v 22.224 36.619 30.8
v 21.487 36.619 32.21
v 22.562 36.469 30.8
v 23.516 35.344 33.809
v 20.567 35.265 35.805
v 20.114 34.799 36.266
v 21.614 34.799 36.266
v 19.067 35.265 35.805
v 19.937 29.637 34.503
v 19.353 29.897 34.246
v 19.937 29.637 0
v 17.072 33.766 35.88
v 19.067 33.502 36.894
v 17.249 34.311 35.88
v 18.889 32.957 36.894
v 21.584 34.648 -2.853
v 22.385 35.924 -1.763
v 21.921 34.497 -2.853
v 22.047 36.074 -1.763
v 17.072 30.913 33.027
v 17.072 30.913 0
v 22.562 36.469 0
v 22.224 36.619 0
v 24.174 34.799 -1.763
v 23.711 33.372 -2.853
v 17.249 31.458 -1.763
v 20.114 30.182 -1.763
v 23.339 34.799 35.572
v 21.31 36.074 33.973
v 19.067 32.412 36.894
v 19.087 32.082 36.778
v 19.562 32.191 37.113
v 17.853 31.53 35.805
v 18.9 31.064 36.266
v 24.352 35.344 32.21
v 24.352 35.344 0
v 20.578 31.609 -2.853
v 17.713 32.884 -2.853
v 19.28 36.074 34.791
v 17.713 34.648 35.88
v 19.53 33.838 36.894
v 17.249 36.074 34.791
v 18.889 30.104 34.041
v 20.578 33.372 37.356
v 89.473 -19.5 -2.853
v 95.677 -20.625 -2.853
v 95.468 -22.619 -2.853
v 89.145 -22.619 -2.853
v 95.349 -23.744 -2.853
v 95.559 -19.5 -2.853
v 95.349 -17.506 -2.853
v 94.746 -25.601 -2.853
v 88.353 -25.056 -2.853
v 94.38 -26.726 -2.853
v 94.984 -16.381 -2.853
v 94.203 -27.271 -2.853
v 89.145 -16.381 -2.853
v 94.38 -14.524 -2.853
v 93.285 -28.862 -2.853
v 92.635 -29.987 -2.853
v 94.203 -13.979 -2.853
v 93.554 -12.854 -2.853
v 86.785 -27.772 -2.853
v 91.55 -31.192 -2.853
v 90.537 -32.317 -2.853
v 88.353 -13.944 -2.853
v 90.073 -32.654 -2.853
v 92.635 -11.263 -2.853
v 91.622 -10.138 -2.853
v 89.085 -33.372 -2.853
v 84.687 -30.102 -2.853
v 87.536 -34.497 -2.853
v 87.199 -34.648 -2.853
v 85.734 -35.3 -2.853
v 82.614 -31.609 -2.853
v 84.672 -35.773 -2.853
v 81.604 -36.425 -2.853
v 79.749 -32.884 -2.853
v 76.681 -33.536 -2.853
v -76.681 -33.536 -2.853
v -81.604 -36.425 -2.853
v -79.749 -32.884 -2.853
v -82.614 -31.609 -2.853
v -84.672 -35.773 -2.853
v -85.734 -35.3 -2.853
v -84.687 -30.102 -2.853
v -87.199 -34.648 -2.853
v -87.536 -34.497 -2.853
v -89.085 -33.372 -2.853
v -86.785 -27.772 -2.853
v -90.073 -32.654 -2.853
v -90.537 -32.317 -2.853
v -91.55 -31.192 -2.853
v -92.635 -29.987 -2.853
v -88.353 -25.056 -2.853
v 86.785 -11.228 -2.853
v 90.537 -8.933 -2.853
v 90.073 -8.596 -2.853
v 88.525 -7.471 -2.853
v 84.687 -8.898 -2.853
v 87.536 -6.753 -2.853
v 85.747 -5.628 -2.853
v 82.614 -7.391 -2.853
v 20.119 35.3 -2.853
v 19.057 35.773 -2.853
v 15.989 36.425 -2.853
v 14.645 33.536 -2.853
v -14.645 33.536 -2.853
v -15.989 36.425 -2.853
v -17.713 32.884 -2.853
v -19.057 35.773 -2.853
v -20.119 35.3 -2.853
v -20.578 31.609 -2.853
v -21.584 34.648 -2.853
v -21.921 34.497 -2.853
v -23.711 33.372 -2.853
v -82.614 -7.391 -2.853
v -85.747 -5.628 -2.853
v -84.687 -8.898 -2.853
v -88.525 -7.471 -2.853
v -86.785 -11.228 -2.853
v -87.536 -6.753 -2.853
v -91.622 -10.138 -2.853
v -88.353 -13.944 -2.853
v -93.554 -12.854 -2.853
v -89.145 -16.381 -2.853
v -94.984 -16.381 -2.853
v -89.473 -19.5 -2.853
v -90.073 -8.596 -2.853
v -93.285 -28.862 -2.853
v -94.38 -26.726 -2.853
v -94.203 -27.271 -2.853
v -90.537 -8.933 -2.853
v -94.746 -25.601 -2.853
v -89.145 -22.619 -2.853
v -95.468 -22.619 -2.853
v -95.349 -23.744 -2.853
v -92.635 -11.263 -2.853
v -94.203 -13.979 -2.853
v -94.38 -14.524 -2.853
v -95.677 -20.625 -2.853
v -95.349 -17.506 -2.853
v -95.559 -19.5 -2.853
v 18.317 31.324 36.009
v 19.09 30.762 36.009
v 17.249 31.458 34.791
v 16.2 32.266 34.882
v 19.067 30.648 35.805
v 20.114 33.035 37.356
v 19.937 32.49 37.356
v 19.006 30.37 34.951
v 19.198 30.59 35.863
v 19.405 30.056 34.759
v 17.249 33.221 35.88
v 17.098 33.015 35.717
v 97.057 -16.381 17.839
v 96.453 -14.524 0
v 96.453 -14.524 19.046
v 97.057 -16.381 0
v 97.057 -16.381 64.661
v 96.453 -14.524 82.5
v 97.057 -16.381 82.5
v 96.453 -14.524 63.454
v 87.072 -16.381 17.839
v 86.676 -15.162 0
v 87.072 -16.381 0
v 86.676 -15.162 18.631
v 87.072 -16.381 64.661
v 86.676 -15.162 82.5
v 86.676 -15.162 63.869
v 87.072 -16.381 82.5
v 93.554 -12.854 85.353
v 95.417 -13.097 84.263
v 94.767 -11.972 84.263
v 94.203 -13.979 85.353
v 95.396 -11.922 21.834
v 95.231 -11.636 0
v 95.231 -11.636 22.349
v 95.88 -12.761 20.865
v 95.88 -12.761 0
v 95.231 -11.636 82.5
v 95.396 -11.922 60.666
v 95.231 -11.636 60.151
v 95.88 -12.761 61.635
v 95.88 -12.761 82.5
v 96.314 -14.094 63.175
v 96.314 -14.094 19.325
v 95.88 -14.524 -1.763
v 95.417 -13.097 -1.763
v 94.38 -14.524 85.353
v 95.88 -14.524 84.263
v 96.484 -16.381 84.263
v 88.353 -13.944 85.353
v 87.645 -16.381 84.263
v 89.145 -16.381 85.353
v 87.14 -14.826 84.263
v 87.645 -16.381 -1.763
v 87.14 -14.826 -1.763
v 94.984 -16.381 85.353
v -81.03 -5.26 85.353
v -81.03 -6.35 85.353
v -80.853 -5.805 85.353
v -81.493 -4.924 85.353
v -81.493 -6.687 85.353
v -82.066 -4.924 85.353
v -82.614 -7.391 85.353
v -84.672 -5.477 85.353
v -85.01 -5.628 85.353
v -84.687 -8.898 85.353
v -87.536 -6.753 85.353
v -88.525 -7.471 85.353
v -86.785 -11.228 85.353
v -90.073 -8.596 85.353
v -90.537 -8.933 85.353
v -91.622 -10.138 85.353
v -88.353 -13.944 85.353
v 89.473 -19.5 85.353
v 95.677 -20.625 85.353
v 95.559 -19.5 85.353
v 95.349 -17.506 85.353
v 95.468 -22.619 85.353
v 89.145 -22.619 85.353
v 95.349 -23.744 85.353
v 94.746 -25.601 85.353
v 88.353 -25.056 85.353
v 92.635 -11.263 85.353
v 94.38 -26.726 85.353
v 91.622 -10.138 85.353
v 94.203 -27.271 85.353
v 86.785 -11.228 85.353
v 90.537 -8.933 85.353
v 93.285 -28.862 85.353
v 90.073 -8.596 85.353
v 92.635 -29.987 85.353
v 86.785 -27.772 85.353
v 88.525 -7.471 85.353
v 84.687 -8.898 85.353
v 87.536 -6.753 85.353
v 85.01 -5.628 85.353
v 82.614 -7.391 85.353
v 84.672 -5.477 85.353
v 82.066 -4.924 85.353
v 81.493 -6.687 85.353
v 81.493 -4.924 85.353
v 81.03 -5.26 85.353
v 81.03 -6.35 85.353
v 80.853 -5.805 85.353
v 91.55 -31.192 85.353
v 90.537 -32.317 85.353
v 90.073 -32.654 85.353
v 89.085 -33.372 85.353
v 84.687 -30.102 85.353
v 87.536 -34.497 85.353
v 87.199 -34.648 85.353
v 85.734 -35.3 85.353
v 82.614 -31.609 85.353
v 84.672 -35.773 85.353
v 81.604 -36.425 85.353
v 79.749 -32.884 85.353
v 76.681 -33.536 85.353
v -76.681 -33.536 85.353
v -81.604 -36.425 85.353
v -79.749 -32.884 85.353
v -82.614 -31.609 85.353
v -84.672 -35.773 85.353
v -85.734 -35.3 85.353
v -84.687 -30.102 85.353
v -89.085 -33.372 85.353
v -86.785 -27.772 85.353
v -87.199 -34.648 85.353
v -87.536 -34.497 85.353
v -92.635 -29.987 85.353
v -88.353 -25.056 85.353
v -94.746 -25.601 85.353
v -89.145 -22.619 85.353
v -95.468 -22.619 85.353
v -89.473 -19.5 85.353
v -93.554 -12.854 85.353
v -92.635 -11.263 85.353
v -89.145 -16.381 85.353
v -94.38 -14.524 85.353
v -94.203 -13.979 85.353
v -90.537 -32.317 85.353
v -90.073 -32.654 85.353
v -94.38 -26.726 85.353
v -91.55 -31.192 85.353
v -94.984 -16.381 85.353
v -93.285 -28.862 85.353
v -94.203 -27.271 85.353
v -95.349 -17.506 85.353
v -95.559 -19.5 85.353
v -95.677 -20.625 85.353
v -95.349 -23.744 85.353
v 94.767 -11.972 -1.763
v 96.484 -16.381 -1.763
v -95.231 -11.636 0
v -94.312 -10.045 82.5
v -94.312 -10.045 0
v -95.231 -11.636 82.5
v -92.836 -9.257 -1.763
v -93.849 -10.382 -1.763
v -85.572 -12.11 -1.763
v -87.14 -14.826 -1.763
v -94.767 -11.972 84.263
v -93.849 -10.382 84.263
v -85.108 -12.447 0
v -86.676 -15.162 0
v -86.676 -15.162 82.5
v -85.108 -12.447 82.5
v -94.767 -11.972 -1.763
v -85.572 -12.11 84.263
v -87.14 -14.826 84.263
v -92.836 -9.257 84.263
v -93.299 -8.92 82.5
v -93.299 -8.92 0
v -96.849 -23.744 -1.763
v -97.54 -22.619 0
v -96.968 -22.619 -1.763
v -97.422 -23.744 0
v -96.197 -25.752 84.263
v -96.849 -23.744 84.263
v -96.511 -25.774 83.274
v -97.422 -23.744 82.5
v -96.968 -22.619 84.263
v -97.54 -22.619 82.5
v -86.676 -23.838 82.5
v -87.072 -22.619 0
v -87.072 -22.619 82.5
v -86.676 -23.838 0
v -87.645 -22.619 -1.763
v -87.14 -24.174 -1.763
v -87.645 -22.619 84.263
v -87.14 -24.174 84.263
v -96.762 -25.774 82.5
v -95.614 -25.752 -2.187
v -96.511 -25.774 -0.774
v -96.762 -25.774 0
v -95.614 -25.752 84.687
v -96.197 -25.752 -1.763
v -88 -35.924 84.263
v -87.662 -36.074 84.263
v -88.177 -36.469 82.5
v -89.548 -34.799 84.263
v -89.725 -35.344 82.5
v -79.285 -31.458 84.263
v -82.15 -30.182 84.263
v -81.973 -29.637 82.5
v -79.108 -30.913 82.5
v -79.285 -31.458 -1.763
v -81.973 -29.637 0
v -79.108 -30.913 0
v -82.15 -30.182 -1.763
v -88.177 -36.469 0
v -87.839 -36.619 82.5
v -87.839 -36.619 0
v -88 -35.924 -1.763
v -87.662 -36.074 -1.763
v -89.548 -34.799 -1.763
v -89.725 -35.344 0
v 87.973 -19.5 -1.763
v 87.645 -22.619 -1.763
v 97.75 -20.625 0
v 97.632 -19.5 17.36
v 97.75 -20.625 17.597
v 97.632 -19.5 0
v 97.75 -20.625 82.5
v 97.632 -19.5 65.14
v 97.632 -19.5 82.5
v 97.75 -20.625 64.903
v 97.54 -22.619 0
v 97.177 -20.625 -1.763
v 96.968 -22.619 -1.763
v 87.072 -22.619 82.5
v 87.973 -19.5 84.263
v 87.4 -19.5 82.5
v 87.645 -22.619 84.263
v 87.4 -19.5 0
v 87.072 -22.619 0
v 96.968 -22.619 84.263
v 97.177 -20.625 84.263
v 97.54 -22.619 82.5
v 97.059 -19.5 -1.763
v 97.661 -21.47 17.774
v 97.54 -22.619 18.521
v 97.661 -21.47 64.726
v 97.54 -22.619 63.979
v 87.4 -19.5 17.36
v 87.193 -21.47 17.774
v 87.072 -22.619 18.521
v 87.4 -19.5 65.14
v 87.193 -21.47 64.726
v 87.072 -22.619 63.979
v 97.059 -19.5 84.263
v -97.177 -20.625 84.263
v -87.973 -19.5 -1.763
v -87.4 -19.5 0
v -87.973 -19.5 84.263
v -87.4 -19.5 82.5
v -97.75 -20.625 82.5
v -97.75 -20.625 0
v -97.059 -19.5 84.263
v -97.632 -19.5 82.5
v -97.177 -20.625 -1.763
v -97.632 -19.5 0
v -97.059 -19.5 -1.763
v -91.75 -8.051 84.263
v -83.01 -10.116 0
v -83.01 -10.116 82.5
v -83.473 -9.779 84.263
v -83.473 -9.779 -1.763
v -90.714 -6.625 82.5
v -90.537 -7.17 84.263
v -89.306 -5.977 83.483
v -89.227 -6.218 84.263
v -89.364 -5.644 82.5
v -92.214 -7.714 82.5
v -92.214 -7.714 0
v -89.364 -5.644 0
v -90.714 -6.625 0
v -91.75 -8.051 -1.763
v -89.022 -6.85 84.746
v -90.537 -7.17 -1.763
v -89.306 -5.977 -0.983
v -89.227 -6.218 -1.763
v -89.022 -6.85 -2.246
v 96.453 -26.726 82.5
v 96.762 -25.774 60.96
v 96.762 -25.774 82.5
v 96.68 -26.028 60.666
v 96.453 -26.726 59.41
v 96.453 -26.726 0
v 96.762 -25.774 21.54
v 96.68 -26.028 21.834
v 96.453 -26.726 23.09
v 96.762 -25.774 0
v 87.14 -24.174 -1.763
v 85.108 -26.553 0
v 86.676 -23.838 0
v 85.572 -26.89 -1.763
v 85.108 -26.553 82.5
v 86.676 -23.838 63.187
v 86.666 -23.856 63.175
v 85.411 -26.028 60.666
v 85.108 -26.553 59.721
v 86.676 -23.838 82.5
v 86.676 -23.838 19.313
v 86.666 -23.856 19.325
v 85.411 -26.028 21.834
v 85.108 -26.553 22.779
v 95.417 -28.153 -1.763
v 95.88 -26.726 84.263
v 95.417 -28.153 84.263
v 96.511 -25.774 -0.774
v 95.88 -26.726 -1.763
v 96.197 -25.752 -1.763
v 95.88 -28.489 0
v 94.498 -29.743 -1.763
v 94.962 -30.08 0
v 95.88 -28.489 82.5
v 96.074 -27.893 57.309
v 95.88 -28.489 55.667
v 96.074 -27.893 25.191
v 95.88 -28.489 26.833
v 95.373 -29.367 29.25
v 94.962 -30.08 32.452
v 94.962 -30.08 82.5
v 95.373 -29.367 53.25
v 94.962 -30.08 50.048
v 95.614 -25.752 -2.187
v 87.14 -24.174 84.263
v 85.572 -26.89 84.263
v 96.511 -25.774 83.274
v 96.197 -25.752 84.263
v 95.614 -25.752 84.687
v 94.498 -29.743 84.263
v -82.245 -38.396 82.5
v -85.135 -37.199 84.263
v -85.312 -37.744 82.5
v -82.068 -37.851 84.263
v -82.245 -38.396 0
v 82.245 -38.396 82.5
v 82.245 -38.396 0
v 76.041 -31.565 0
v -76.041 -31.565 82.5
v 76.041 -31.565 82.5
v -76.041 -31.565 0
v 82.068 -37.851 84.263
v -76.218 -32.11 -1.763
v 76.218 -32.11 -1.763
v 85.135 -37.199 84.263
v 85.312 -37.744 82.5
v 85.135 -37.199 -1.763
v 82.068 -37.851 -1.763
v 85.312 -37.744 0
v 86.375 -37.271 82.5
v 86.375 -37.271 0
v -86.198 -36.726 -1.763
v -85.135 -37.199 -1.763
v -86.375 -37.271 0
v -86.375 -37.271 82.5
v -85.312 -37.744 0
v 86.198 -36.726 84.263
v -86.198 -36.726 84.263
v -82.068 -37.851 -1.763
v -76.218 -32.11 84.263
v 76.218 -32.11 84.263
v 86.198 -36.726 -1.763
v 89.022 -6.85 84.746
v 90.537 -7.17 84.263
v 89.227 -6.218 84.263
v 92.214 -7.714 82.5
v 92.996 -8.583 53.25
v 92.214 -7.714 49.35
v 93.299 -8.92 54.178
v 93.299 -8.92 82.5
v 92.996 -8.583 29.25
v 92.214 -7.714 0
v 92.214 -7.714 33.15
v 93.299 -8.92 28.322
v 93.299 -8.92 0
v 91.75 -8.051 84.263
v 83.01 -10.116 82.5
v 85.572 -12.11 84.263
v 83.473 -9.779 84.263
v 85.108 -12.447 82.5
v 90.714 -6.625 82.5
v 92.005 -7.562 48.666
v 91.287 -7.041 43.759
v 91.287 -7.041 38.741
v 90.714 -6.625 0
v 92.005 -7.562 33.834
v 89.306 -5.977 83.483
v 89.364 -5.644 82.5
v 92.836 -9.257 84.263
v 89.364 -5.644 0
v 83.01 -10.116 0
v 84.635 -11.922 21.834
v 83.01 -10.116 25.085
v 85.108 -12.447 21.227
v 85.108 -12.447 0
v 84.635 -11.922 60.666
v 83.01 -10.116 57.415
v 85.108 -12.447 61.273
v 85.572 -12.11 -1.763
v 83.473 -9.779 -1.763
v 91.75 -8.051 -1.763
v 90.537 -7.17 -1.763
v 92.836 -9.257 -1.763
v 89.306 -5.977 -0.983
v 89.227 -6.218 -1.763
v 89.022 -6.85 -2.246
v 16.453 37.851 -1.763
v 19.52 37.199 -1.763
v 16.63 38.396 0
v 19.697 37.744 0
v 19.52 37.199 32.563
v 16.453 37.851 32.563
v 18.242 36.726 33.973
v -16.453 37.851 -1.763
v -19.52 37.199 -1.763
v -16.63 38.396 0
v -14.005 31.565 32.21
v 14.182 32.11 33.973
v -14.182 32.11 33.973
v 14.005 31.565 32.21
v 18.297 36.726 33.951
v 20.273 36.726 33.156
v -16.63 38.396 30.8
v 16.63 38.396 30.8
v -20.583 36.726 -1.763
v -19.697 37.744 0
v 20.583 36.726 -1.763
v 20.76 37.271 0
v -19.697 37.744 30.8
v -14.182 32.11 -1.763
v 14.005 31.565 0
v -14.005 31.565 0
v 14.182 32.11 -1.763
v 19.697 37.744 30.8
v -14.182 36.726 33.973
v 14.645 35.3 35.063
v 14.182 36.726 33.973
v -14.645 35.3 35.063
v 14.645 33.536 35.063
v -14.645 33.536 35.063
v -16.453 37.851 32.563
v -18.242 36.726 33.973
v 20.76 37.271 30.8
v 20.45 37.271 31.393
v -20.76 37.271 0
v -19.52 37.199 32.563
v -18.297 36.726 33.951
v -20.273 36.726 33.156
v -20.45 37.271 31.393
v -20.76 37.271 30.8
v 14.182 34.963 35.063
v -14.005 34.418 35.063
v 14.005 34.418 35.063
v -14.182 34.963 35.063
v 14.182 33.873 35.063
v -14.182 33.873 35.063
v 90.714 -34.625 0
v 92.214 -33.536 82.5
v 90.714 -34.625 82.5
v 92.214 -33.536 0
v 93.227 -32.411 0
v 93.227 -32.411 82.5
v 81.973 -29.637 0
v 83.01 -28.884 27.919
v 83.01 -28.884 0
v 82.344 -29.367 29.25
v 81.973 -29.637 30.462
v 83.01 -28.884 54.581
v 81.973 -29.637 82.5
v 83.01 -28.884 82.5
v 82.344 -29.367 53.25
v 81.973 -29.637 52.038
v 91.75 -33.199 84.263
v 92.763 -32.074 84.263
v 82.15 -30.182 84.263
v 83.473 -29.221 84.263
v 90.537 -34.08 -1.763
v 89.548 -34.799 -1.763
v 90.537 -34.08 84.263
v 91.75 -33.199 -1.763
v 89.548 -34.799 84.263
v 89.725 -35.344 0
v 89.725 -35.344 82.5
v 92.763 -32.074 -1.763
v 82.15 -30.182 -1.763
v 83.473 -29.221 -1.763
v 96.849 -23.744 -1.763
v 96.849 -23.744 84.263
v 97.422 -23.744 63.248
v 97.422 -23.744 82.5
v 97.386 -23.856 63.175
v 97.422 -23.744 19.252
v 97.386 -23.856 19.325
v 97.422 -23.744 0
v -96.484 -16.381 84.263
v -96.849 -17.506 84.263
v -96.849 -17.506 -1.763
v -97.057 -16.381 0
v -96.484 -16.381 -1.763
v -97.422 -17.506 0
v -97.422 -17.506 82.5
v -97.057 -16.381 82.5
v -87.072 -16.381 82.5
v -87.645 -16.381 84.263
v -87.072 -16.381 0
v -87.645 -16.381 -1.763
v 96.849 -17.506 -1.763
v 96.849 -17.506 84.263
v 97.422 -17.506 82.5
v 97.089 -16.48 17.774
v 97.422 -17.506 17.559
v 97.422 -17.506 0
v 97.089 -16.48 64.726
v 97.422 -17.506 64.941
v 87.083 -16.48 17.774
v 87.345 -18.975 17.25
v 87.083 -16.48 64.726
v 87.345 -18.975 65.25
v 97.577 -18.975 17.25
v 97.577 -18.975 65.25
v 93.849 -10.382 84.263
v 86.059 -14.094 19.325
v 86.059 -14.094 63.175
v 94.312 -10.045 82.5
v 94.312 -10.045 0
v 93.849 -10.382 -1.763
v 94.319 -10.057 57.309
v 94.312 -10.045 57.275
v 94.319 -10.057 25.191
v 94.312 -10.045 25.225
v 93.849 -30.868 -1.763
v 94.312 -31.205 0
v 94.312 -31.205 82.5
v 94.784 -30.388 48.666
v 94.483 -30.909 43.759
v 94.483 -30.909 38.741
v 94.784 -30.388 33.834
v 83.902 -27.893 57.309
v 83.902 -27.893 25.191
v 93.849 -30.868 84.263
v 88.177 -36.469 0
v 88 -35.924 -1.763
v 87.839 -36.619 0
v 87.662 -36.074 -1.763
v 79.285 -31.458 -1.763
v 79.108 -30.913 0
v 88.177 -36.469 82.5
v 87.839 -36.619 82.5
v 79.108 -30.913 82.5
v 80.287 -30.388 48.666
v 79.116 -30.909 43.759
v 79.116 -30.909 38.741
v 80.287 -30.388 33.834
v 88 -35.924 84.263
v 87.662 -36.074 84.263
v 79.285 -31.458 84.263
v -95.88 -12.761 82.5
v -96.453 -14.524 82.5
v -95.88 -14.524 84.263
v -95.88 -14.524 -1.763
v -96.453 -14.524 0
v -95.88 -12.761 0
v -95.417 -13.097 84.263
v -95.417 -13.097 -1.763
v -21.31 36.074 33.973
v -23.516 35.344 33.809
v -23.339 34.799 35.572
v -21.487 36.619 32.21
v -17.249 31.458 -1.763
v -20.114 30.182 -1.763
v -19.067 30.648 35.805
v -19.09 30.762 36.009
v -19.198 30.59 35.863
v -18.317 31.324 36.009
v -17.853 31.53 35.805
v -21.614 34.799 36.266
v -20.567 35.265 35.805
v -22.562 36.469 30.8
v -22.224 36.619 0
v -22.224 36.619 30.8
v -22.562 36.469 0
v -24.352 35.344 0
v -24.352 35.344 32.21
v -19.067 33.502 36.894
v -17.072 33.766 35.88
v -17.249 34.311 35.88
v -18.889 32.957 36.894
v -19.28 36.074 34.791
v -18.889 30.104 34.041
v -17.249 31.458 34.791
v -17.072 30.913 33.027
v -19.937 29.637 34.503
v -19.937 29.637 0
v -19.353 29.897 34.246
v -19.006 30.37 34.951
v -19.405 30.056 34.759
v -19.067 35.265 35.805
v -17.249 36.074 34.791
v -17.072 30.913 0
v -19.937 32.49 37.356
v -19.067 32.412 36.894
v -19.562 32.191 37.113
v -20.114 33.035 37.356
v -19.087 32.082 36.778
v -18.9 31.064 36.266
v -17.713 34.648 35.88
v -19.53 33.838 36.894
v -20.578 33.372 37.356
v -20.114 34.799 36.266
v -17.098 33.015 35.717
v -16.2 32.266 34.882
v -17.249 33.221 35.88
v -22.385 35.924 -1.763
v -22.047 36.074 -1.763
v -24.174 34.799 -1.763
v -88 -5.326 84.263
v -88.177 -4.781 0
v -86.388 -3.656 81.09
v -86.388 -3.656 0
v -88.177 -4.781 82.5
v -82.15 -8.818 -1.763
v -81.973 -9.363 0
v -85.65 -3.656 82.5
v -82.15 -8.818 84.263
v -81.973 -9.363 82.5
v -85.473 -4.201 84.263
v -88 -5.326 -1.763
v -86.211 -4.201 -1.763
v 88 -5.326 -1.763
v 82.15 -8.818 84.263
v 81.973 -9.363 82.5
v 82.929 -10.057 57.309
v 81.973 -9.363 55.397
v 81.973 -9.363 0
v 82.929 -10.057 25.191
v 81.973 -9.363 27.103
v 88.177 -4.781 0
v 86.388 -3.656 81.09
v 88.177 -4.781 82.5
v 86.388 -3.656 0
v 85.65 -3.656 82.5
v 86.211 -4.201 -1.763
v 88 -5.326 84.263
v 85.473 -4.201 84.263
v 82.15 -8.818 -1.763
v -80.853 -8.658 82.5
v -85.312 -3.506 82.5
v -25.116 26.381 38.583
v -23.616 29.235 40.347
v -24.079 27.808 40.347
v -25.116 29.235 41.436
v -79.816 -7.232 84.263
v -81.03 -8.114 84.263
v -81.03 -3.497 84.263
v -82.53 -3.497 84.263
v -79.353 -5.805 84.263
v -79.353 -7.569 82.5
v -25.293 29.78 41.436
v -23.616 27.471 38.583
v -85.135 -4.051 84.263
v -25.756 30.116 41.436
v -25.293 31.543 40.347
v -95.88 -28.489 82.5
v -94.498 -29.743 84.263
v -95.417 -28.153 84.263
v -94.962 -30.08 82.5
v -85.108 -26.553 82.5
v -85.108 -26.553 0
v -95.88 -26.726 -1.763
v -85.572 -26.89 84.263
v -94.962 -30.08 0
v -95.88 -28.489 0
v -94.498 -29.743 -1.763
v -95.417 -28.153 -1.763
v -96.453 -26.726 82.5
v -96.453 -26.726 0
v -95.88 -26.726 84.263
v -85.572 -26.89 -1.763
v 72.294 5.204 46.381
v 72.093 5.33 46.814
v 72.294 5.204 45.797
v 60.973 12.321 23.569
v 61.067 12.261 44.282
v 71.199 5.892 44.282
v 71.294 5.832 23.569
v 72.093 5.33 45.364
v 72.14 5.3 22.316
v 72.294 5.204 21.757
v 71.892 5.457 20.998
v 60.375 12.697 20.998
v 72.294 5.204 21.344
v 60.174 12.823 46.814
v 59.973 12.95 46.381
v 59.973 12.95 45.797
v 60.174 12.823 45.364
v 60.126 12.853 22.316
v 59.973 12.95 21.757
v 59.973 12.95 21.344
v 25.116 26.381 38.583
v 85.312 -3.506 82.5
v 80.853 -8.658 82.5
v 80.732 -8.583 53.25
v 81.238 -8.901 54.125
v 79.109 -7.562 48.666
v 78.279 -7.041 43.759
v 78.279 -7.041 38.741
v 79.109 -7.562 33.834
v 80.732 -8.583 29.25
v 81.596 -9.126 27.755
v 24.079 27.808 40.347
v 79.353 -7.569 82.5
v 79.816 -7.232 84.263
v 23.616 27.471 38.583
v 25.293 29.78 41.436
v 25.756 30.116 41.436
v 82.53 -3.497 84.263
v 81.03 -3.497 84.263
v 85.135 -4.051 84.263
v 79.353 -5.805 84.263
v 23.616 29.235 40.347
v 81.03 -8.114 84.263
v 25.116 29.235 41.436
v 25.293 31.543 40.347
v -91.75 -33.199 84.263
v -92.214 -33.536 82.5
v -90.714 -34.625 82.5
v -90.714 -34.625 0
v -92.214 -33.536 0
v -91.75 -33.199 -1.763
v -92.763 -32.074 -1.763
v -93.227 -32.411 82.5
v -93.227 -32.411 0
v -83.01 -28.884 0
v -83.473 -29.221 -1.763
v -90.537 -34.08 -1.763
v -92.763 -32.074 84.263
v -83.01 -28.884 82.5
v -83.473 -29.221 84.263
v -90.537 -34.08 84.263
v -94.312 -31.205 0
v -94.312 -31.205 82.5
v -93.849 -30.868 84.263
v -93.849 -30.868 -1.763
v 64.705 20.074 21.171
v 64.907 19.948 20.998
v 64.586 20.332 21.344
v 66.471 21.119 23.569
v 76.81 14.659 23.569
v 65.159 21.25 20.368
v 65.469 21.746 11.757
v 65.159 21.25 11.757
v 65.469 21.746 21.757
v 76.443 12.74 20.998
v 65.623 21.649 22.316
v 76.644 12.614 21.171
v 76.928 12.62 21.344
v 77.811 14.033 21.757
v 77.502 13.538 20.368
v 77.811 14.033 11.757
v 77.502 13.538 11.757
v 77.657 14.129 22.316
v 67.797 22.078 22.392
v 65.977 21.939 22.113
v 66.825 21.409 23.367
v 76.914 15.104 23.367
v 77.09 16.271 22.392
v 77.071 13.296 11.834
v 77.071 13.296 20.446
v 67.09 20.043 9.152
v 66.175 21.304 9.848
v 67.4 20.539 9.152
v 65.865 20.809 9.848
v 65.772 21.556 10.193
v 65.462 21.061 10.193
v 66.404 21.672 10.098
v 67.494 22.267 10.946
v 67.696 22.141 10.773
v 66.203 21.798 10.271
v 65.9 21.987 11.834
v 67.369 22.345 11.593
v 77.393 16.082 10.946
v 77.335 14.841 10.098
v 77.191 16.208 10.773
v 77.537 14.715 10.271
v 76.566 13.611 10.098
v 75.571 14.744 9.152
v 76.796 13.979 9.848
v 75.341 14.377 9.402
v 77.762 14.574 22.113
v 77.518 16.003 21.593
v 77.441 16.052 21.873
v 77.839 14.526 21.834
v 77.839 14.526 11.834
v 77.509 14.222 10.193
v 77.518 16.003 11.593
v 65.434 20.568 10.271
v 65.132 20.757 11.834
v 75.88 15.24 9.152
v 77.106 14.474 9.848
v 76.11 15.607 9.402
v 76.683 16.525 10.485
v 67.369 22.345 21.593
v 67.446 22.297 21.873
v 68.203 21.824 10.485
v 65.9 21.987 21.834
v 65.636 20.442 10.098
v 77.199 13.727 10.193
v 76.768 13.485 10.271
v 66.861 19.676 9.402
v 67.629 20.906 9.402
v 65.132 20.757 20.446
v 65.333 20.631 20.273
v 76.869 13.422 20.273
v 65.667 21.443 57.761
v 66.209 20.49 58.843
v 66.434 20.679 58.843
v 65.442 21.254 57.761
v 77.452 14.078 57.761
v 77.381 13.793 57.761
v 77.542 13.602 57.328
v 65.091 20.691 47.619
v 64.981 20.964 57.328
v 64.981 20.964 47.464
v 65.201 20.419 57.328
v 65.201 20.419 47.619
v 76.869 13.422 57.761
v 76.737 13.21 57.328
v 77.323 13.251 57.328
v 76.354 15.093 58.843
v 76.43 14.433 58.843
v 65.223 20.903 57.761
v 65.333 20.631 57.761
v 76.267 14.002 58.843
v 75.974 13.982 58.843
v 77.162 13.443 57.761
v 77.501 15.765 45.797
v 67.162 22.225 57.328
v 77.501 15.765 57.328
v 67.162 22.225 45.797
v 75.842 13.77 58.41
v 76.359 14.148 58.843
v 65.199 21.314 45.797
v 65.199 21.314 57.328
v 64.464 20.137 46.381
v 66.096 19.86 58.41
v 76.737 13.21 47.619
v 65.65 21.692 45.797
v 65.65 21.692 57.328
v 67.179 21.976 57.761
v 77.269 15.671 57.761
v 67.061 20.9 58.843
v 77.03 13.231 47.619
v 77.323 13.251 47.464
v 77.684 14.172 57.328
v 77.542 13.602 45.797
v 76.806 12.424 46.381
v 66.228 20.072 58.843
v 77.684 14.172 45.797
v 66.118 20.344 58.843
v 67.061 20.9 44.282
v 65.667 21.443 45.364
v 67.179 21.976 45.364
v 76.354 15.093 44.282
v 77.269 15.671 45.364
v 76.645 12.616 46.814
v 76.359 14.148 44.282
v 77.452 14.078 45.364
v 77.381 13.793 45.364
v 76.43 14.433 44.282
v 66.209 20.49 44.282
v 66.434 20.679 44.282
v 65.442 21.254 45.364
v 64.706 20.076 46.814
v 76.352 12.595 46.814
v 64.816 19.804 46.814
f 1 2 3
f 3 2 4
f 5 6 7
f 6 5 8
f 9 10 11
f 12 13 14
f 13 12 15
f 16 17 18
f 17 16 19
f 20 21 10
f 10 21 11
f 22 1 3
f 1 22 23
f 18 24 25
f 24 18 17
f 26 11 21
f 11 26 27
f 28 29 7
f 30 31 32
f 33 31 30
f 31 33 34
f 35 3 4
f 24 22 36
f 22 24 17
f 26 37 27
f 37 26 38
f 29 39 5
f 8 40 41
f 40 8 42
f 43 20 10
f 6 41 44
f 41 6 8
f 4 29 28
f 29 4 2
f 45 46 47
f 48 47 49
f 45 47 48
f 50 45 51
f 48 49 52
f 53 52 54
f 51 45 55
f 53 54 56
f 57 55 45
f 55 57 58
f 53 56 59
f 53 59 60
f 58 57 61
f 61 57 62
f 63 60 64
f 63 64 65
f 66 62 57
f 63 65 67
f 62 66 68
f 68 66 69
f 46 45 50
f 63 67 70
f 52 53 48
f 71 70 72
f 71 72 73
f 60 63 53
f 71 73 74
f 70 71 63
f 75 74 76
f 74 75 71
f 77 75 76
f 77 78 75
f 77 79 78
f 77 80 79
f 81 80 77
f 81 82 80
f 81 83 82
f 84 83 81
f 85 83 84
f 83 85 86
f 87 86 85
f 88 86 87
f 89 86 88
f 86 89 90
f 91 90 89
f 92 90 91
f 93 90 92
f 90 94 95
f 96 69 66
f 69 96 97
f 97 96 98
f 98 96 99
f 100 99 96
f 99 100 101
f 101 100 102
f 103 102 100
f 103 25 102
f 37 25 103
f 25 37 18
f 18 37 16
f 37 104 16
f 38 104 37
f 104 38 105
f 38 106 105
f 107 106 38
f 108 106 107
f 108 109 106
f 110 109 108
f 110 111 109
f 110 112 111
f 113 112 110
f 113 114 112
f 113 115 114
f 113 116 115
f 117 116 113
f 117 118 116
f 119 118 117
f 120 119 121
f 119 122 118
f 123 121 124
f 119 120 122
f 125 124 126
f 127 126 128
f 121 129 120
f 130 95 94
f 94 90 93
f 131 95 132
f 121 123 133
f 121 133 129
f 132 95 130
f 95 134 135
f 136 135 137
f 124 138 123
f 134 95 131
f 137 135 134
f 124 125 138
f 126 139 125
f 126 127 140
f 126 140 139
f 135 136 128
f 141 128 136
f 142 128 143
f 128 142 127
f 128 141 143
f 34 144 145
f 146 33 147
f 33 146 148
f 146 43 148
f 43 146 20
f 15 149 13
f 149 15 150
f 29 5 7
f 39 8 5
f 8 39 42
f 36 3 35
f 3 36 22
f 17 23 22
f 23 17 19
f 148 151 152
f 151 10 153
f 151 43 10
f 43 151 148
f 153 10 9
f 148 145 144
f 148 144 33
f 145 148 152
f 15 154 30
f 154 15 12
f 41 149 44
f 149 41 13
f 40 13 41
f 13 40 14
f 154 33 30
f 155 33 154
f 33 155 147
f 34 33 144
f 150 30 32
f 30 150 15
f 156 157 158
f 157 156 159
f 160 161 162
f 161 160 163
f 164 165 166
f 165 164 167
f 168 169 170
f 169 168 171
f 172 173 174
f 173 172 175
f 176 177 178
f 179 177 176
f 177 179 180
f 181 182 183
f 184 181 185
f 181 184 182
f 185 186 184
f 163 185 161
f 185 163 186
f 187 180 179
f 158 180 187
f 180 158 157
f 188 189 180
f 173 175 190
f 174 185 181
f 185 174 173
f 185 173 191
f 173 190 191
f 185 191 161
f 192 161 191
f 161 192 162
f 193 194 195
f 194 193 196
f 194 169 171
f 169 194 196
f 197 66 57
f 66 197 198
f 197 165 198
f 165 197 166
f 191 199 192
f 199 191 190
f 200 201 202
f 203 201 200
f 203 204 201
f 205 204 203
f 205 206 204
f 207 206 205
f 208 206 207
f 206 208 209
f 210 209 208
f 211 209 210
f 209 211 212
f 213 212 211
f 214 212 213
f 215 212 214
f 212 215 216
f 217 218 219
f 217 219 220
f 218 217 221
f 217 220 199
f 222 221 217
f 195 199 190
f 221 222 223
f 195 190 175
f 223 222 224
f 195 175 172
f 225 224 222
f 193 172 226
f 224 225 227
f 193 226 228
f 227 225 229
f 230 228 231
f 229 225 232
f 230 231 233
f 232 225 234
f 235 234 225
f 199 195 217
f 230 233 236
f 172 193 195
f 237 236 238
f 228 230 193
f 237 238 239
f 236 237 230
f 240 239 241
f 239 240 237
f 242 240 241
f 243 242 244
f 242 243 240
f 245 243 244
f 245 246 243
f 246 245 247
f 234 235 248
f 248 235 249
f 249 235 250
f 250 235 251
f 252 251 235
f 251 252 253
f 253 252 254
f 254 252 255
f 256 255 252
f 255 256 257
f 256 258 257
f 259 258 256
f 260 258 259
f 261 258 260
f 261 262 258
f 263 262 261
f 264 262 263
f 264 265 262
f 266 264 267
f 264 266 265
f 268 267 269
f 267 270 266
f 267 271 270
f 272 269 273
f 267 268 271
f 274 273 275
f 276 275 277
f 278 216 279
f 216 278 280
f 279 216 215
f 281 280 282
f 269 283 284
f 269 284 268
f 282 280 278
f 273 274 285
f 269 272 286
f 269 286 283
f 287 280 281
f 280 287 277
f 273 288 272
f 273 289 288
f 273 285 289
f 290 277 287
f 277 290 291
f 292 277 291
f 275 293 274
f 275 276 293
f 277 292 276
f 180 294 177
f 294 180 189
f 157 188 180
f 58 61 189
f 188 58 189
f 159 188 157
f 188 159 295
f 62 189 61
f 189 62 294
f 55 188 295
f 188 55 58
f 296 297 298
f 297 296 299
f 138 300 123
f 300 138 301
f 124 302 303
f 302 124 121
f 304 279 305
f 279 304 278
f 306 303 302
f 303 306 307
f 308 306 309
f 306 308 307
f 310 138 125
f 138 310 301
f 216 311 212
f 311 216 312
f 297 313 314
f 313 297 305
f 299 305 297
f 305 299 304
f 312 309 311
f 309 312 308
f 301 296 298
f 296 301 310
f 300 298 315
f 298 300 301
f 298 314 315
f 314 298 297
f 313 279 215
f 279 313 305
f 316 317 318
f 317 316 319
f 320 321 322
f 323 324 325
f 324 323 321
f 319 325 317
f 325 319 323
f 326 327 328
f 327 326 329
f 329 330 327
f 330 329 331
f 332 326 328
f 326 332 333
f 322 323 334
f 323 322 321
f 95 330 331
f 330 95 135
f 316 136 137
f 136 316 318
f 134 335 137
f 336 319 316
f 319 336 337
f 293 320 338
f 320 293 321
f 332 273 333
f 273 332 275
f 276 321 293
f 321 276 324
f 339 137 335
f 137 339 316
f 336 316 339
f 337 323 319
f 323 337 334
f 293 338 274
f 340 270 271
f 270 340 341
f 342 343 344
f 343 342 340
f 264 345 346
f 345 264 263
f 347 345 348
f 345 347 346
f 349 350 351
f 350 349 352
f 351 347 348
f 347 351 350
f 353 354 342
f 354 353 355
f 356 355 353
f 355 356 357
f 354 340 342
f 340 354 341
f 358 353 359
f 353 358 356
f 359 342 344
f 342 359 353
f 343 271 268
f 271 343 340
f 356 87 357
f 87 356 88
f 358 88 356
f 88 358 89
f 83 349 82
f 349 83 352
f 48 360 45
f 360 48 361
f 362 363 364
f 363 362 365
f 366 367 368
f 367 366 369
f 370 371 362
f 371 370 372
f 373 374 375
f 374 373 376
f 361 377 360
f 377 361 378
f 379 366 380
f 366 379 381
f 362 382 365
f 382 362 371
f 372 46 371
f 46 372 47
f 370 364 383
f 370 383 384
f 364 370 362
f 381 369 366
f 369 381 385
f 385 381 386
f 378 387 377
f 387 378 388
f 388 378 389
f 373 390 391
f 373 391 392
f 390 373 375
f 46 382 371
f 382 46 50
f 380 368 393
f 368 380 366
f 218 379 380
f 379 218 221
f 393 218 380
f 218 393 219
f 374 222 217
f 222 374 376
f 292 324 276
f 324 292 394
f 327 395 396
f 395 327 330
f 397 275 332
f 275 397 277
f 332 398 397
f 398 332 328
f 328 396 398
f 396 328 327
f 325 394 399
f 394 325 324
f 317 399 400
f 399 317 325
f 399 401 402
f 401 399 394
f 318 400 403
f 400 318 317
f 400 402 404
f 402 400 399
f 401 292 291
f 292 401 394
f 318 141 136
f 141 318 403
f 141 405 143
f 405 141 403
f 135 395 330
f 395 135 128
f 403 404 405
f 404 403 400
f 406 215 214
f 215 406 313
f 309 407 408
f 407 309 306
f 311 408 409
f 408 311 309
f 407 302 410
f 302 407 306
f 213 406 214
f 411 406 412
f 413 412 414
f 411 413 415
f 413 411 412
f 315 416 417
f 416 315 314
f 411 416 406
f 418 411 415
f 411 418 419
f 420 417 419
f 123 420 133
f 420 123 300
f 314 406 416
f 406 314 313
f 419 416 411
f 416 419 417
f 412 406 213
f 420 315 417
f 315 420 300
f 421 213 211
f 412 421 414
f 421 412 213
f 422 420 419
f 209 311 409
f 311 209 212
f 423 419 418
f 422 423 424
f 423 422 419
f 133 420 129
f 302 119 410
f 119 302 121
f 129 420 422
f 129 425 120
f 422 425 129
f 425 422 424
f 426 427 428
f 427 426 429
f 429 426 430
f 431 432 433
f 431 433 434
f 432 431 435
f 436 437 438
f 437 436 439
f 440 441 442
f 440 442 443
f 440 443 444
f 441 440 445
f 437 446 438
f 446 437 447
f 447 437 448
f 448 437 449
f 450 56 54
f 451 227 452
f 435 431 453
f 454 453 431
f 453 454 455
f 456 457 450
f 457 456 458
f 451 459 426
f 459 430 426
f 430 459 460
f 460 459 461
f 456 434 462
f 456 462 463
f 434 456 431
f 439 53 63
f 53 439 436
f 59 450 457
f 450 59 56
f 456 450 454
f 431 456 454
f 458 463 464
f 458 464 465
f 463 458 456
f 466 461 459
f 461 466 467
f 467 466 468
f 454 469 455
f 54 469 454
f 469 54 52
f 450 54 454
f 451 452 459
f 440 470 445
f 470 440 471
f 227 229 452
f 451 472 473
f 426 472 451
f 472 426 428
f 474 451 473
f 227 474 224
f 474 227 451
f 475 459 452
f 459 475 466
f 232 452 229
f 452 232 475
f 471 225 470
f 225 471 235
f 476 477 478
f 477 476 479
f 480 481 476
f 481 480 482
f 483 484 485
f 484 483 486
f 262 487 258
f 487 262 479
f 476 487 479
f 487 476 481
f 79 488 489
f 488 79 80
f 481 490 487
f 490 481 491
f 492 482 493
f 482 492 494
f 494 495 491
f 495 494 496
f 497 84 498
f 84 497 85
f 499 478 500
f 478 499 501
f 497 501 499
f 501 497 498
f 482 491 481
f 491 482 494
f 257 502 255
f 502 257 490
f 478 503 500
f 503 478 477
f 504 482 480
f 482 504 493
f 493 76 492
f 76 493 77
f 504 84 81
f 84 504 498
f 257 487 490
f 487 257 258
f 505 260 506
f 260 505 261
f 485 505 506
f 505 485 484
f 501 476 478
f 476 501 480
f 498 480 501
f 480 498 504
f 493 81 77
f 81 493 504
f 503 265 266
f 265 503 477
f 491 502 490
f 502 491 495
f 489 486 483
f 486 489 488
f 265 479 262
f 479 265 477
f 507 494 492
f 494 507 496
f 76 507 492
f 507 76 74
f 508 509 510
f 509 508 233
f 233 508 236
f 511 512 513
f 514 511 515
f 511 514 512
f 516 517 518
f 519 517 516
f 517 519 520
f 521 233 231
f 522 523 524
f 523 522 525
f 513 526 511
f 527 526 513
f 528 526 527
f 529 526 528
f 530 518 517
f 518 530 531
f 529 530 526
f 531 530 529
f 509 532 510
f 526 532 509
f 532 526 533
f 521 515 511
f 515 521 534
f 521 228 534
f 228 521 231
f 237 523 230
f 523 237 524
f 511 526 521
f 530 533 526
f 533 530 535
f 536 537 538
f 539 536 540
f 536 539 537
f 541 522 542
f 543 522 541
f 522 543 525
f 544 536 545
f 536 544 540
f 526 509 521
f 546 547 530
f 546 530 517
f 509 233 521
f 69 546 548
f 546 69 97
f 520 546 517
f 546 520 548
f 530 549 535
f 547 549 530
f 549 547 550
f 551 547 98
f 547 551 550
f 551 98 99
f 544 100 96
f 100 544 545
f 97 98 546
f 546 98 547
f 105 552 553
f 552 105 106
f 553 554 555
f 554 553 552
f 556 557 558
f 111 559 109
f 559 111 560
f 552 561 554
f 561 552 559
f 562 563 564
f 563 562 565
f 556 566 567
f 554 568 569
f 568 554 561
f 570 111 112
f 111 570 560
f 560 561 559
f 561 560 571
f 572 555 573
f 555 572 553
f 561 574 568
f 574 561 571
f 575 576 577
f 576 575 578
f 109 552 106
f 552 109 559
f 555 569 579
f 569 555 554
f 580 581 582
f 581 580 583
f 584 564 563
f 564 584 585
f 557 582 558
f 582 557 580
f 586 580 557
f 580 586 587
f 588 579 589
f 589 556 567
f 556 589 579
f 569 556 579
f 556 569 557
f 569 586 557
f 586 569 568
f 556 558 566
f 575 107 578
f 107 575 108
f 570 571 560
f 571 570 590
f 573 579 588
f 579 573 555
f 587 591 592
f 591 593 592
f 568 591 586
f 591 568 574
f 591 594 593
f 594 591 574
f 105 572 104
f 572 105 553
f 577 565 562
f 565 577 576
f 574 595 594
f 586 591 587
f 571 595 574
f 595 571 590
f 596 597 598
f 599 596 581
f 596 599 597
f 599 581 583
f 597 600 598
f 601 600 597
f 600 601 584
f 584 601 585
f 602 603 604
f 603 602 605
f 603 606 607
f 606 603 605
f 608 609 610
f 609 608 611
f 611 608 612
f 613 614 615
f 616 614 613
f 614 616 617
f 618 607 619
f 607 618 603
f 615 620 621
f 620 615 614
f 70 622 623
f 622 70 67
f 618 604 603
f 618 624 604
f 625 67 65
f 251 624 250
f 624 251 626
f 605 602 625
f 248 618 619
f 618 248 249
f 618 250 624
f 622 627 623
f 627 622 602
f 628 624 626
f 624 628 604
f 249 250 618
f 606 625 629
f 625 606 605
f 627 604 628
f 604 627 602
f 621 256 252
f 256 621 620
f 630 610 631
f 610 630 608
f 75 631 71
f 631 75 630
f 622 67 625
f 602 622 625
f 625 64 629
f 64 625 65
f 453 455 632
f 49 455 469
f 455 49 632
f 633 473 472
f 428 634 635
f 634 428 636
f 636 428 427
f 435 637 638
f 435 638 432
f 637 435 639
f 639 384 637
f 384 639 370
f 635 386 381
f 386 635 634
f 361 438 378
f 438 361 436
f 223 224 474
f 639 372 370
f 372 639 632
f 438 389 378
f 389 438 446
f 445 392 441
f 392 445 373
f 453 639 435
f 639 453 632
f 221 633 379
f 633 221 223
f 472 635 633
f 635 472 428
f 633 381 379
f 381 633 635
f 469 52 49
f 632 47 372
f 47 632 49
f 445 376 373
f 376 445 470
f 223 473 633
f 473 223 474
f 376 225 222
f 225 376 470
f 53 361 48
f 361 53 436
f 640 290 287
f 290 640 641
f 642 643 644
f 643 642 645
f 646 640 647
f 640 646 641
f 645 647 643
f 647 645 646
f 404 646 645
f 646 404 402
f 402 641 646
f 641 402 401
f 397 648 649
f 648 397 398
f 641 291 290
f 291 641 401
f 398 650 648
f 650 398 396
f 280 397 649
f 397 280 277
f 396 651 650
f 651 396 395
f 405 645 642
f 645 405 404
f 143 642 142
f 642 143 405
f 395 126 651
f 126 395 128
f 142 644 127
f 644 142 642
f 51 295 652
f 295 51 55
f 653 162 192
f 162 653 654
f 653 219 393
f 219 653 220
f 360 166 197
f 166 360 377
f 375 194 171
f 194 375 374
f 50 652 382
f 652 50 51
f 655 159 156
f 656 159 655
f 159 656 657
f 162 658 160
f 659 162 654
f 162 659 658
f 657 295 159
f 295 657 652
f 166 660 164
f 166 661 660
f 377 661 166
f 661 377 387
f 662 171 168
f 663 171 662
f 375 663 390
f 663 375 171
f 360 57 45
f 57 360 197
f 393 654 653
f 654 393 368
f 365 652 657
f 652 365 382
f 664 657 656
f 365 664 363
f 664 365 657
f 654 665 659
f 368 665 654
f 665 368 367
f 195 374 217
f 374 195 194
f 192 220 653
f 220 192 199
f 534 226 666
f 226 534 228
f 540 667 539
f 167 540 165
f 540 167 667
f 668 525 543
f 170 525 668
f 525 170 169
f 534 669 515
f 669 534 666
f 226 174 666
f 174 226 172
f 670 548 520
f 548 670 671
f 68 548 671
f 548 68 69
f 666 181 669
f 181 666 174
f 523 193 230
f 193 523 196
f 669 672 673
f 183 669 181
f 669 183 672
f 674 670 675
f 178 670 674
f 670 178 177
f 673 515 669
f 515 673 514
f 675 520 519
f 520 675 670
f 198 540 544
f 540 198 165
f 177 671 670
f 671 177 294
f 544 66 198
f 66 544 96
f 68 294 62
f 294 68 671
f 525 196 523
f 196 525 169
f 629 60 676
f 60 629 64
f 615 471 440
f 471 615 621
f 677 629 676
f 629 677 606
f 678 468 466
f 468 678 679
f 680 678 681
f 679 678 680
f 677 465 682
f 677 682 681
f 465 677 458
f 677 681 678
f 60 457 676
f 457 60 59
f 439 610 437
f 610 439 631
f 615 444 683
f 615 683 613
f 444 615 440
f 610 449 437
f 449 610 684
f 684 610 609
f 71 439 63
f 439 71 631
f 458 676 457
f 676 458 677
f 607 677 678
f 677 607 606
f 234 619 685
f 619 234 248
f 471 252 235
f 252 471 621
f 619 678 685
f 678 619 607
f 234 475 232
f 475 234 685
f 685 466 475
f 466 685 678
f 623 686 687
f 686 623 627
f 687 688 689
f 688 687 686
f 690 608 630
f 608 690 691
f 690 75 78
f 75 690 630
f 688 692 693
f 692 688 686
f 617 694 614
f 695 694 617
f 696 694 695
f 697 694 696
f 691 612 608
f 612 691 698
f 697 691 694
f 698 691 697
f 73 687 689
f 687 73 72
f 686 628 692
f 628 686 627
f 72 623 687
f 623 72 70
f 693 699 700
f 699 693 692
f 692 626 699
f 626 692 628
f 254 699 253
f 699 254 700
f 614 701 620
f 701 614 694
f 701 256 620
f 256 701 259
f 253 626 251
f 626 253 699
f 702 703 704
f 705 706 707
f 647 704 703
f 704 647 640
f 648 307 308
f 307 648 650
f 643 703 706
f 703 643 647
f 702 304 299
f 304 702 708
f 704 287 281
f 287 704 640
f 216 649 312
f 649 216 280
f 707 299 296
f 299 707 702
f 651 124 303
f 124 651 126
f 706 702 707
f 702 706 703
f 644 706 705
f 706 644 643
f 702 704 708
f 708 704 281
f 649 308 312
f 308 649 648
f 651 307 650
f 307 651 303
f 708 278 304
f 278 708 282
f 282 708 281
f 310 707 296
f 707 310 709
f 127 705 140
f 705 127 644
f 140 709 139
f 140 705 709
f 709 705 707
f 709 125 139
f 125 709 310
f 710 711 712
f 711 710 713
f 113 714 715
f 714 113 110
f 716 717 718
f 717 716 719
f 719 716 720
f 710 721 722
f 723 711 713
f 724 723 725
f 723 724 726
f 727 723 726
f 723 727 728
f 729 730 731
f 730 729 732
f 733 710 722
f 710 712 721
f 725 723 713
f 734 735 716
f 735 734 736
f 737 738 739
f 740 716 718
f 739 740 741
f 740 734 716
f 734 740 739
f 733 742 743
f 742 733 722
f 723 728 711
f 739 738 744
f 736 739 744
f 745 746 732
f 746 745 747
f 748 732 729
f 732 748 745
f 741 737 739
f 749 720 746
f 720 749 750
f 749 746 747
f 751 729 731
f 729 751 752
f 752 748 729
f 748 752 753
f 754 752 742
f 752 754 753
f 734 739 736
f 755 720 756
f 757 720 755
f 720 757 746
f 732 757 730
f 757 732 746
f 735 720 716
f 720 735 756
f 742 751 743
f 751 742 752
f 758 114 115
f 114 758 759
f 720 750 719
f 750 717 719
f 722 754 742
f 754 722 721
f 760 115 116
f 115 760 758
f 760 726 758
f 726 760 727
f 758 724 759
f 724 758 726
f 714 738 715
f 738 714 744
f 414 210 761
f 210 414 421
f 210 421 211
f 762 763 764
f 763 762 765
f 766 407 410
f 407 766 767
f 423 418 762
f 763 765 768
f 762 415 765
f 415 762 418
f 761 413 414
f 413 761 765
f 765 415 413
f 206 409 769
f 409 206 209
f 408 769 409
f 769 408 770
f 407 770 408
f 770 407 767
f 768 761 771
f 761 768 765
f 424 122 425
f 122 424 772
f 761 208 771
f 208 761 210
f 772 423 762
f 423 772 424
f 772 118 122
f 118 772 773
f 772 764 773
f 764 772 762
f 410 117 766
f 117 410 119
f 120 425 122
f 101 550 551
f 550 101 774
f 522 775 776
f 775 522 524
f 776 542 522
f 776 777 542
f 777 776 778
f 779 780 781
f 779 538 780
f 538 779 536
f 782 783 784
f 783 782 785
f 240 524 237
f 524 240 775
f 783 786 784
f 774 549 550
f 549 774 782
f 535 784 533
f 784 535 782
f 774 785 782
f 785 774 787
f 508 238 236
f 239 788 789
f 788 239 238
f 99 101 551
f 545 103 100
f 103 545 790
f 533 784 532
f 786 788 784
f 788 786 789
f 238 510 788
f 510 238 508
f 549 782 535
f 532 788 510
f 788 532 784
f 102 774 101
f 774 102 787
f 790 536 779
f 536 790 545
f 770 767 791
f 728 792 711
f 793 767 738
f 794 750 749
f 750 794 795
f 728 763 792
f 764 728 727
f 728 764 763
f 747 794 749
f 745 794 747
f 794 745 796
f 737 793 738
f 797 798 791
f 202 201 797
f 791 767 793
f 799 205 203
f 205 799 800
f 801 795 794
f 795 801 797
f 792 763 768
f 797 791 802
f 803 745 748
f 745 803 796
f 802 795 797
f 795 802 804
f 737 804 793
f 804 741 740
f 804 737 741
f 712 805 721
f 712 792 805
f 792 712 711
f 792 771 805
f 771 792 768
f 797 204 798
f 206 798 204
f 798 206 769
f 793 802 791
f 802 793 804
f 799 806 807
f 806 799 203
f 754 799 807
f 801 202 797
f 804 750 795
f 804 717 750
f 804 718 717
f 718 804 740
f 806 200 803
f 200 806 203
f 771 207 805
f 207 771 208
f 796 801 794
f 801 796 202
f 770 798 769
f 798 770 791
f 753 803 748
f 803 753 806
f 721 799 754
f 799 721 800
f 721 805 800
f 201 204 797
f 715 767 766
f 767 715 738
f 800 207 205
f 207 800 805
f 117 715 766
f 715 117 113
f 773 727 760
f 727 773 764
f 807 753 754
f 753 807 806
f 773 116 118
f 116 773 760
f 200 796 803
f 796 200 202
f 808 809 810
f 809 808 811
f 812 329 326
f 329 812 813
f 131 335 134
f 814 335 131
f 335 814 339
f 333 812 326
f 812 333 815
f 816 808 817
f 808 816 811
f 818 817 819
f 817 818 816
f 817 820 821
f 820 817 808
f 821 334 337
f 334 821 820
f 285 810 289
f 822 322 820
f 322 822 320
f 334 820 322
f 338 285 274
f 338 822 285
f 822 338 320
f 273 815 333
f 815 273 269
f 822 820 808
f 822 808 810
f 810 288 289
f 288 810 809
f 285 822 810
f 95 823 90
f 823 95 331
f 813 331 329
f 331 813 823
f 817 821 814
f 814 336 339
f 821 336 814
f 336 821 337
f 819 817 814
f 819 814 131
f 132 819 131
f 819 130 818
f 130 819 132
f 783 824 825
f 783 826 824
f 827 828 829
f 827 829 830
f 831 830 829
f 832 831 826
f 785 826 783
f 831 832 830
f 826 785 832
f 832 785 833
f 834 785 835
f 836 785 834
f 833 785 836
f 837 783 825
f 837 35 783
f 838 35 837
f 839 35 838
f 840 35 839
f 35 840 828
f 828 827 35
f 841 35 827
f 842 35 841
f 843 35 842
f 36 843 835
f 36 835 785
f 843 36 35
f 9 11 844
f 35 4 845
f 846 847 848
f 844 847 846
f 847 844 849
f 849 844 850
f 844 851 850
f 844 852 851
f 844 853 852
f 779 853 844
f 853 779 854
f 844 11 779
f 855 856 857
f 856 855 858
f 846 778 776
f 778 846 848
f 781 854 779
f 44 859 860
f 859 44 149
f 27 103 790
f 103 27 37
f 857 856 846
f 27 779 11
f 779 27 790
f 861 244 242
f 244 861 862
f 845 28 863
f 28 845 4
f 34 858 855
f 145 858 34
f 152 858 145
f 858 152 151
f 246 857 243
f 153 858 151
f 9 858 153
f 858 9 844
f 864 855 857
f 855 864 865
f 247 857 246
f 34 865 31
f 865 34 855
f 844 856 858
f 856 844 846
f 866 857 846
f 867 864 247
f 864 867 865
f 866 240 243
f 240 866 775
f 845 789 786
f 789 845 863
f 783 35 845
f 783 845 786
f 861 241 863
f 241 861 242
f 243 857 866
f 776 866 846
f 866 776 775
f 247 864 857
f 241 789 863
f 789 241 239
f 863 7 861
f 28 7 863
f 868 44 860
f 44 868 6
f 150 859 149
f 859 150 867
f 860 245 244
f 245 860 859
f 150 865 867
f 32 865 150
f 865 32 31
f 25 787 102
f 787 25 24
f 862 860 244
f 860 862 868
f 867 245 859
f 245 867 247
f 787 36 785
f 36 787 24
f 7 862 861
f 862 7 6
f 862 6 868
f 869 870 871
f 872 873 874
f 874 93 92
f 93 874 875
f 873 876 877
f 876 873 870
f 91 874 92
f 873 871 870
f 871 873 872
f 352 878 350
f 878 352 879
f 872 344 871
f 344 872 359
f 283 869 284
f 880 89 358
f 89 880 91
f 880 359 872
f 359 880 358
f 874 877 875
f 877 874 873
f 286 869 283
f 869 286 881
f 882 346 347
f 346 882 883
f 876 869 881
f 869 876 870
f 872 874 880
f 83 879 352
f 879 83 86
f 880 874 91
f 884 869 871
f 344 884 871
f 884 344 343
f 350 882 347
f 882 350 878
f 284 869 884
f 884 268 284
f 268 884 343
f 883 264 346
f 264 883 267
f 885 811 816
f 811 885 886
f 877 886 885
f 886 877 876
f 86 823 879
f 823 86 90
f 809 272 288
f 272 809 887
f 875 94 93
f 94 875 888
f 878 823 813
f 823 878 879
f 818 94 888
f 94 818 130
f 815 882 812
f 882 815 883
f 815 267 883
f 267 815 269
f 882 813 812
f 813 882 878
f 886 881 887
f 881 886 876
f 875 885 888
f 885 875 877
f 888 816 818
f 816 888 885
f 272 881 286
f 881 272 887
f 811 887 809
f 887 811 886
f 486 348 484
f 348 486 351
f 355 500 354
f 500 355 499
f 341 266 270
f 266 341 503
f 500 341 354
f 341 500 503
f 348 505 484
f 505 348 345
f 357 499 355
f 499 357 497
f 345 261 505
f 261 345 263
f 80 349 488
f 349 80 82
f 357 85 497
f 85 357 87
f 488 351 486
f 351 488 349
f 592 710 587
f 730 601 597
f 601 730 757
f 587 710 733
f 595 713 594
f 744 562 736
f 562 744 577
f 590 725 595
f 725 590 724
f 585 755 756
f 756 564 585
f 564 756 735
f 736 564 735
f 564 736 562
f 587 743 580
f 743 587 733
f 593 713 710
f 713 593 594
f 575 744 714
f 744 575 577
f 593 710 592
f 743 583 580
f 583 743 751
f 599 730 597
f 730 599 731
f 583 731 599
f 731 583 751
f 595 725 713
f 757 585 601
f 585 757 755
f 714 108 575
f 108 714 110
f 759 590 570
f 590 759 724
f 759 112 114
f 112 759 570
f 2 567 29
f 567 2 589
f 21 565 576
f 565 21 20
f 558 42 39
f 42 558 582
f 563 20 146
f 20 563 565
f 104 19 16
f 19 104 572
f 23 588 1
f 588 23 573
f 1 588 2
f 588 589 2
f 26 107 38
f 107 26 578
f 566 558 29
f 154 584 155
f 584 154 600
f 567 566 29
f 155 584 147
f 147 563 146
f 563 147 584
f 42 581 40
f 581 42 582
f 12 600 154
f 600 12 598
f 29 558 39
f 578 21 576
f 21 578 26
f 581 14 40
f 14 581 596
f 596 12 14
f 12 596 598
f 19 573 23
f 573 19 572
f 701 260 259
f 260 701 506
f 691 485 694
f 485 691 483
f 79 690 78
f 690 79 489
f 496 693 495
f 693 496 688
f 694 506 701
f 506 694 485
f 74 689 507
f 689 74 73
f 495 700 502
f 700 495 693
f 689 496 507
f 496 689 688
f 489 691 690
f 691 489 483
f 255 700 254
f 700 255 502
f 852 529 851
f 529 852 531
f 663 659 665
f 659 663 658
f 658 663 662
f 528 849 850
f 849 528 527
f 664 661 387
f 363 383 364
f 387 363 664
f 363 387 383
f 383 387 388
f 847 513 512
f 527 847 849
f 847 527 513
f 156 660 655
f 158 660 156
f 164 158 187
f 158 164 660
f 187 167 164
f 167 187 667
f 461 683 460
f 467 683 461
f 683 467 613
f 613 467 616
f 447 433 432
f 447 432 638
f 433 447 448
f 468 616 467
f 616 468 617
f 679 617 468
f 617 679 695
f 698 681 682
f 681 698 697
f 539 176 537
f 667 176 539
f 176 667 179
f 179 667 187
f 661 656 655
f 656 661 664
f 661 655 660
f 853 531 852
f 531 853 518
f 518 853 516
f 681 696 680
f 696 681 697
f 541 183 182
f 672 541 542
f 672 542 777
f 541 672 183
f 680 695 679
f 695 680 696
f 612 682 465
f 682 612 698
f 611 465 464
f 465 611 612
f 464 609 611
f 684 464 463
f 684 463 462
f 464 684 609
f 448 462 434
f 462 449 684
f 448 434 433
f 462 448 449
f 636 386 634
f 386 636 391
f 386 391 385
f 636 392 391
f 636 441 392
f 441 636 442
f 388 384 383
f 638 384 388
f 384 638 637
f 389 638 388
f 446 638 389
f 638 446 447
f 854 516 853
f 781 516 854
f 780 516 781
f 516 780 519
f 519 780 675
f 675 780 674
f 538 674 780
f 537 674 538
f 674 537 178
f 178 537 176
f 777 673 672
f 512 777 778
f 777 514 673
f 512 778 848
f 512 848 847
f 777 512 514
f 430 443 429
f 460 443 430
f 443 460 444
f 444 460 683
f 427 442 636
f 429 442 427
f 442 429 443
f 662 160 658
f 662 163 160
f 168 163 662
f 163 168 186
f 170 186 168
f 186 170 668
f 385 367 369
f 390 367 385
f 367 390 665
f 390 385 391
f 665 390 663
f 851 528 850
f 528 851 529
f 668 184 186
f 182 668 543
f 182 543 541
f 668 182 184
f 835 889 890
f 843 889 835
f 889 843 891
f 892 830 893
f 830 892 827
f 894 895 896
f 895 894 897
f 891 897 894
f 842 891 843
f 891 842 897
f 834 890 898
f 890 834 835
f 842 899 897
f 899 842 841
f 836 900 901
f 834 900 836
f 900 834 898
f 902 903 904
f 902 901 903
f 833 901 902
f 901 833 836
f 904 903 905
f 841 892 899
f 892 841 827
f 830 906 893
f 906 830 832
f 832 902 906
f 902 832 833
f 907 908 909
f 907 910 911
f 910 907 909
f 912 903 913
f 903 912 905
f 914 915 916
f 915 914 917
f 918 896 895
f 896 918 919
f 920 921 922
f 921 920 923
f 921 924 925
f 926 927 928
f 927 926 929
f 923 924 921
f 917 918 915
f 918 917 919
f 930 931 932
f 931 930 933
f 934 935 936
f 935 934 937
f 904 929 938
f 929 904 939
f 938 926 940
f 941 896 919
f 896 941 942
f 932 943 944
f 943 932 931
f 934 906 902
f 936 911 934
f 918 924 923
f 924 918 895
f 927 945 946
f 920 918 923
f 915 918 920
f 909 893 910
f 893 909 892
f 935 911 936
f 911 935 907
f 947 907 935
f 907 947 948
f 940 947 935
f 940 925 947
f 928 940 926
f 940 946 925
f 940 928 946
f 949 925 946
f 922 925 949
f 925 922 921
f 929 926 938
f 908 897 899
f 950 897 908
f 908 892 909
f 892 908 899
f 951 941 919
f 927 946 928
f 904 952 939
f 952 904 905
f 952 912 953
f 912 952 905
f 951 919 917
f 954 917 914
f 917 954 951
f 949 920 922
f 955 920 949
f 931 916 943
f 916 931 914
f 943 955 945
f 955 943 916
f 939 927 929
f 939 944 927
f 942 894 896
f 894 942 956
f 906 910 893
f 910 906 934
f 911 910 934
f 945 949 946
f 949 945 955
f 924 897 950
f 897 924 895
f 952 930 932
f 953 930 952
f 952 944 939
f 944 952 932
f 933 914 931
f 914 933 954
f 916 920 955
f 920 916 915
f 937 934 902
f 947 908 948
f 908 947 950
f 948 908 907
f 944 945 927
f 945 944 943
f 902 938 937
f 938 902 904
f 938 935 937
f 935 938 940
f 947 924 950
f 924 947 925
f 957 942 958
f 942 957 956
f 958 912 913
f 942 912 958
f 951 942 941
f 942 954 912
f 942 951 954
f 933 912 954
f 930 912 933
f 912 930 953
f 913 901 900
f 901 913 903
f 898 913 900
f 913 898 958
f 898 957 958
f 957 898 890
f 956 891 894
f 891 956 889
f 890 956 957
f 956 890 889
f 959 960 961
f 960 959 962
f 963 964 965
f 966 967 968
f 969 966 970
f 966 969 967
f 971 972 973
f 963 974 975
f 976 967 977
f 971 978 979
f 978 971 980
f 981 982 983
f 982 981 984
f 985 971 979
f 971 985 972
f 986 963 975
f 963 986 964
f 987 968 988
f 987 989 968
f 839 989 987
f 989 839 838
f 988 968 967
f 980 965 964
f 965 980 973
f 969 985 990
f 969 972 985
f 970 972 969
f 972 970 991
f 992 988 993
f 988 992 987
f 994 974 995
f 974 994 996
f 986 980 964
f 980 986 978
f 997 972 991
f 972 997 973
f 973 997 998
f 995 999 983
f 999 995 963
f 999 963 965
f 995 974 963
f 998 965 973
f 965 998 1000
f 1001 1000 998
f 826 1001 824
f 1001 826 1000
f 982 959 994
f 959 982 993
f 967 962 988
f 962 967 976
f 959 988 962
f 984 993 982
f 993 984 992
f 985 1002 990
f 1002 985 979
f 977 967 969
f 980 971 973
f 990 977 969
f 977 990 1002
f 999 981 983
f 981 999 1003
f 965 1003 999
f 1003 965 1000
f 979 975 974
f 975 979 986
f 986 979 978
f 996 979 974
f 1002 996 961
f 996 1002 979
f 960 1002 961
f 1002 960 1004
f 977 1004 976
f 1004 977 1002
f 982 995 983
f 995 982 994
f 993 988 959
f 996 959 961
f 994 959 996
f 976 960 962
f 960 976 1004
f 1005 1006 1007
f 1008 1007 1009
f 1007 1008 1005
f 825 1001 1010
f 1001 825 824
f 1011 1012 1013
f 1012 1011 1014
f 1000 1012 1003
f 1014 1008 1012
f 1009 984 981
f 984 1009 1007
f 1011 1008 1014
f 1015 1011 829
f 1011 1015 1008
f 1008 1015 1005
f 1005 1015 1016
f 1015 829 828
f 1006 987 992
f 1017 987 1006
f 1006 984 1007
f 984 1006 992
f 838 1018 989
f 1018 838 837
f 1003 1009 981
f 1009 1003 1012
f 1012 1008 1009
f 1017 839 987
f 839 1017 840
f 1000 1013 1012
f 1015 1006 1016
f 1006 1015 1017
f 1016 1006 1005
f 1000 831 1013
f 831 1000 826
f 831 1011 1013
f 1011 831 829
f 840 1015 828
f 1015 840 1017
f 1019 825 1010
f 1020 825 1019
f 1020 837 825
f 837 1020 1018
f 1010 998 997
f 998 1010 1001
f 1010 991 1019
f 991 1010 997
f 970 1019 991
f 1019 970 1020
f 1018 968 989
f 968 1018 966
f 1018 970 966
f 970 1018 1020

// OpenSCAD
//Design an Object: Outlet Phone Holder
//By jessicad2020
//v.1.1, 22 Jan 2019

//parameters -----------------------------------------------
chargeW = 25.7; //width of an Apple charger block
chargeL = 28; //length of an Apple charger block
chargeH = 26.3; //height of an Apple charger block
phoneL = 145; //length of phone with case
phoneW = 75; //width of phone with case
phoneH = 15; //height of phone with case
rad = 15; //cylinder radius
scrad = 12; //oval radius
hs = 15; //hook size
sd= 2; //sphere diameter

//render ---------------------------------------------------
%phone();
holder(1.1);
%charge();

//modules --------------------------------------------------
module holder(size) {
    difference() {
        minkowski() {
            holderbase(size);
            sphere(r=sd*1.5);
        }
        semic(size);
    }
    translate([phoneL*size*0.43,13,phoneW/5*size]) {
        rotate([0,90,58]) {
            hook(10);
        }
    }
    translate([phoneL*size*0.43,13,phoneW/1.6*size]) {
        rotate([0,180,58]) {
            hook(10);
        }
    }
}

module holderbase(size) {
    difference() {
        triangle(size, 1);
        triangle(size-0.06, 5);
    }       
}

module hook(s) {
    minkowski() {
        difference() {
            roundbx(s);
            translate([s/1.5,0,s/-1.5]) {
                roundbx(s*2);
            }
        }
        sphere(d=sd/2);
    }
}

module roundbx(size) {
    minkowski() {
        cube(size=size, center=true);
        sphere(sd);
    }
}

module semic(size) {
   translate([phoneL*size*0.55, phoneW*size*-0.23, phoneW/2*size]) {
       rotate([0,90,0]) {
           scale([2,1,1]) {
               cylinder(r=scrad, h=scrad*3, center=true);
           }
       }
  } 
}

module triangle(size, height) {
    hull() {
        translate([phoneL*size*0.5, phoneW*size/2*-0.5, phoneW*size*0.5]) {
            cylinder(h=phoneW*size*height, r=rad, center=true);
    }
        translate([phoneL*size*-0.5, phoneW*size/2*-0.5, phoneW*size*0.5]) {
            cylinder(h=phoneW*size*height, r=rad, center=true);
        }
        translate([chargeW*size*0.5, phoneW*size/2*0.5, chargeL*size*0.5]) {
            cylinder(h=chargeL*size*height, r=rad, center=true);
        }
        translate([chargeW*size*-0.5, phoneW*size/2*0.5, chargeL*size*0.5]) {
            cylinder(h=chargeL*size*height, r=rad, center=true);
        }
    }
    
}

module phone() {
    translate([0,phoneL*-0.15, phoneW*0.5]) {
        cube([phoneL, phoneH, phoneW], center=true);
    }
}

module charge() {
    translate([0,phoneW*0.15,chargeL/2]) {
        cube([chargeW, chargeH, chargeL], center=true);
    }
}
